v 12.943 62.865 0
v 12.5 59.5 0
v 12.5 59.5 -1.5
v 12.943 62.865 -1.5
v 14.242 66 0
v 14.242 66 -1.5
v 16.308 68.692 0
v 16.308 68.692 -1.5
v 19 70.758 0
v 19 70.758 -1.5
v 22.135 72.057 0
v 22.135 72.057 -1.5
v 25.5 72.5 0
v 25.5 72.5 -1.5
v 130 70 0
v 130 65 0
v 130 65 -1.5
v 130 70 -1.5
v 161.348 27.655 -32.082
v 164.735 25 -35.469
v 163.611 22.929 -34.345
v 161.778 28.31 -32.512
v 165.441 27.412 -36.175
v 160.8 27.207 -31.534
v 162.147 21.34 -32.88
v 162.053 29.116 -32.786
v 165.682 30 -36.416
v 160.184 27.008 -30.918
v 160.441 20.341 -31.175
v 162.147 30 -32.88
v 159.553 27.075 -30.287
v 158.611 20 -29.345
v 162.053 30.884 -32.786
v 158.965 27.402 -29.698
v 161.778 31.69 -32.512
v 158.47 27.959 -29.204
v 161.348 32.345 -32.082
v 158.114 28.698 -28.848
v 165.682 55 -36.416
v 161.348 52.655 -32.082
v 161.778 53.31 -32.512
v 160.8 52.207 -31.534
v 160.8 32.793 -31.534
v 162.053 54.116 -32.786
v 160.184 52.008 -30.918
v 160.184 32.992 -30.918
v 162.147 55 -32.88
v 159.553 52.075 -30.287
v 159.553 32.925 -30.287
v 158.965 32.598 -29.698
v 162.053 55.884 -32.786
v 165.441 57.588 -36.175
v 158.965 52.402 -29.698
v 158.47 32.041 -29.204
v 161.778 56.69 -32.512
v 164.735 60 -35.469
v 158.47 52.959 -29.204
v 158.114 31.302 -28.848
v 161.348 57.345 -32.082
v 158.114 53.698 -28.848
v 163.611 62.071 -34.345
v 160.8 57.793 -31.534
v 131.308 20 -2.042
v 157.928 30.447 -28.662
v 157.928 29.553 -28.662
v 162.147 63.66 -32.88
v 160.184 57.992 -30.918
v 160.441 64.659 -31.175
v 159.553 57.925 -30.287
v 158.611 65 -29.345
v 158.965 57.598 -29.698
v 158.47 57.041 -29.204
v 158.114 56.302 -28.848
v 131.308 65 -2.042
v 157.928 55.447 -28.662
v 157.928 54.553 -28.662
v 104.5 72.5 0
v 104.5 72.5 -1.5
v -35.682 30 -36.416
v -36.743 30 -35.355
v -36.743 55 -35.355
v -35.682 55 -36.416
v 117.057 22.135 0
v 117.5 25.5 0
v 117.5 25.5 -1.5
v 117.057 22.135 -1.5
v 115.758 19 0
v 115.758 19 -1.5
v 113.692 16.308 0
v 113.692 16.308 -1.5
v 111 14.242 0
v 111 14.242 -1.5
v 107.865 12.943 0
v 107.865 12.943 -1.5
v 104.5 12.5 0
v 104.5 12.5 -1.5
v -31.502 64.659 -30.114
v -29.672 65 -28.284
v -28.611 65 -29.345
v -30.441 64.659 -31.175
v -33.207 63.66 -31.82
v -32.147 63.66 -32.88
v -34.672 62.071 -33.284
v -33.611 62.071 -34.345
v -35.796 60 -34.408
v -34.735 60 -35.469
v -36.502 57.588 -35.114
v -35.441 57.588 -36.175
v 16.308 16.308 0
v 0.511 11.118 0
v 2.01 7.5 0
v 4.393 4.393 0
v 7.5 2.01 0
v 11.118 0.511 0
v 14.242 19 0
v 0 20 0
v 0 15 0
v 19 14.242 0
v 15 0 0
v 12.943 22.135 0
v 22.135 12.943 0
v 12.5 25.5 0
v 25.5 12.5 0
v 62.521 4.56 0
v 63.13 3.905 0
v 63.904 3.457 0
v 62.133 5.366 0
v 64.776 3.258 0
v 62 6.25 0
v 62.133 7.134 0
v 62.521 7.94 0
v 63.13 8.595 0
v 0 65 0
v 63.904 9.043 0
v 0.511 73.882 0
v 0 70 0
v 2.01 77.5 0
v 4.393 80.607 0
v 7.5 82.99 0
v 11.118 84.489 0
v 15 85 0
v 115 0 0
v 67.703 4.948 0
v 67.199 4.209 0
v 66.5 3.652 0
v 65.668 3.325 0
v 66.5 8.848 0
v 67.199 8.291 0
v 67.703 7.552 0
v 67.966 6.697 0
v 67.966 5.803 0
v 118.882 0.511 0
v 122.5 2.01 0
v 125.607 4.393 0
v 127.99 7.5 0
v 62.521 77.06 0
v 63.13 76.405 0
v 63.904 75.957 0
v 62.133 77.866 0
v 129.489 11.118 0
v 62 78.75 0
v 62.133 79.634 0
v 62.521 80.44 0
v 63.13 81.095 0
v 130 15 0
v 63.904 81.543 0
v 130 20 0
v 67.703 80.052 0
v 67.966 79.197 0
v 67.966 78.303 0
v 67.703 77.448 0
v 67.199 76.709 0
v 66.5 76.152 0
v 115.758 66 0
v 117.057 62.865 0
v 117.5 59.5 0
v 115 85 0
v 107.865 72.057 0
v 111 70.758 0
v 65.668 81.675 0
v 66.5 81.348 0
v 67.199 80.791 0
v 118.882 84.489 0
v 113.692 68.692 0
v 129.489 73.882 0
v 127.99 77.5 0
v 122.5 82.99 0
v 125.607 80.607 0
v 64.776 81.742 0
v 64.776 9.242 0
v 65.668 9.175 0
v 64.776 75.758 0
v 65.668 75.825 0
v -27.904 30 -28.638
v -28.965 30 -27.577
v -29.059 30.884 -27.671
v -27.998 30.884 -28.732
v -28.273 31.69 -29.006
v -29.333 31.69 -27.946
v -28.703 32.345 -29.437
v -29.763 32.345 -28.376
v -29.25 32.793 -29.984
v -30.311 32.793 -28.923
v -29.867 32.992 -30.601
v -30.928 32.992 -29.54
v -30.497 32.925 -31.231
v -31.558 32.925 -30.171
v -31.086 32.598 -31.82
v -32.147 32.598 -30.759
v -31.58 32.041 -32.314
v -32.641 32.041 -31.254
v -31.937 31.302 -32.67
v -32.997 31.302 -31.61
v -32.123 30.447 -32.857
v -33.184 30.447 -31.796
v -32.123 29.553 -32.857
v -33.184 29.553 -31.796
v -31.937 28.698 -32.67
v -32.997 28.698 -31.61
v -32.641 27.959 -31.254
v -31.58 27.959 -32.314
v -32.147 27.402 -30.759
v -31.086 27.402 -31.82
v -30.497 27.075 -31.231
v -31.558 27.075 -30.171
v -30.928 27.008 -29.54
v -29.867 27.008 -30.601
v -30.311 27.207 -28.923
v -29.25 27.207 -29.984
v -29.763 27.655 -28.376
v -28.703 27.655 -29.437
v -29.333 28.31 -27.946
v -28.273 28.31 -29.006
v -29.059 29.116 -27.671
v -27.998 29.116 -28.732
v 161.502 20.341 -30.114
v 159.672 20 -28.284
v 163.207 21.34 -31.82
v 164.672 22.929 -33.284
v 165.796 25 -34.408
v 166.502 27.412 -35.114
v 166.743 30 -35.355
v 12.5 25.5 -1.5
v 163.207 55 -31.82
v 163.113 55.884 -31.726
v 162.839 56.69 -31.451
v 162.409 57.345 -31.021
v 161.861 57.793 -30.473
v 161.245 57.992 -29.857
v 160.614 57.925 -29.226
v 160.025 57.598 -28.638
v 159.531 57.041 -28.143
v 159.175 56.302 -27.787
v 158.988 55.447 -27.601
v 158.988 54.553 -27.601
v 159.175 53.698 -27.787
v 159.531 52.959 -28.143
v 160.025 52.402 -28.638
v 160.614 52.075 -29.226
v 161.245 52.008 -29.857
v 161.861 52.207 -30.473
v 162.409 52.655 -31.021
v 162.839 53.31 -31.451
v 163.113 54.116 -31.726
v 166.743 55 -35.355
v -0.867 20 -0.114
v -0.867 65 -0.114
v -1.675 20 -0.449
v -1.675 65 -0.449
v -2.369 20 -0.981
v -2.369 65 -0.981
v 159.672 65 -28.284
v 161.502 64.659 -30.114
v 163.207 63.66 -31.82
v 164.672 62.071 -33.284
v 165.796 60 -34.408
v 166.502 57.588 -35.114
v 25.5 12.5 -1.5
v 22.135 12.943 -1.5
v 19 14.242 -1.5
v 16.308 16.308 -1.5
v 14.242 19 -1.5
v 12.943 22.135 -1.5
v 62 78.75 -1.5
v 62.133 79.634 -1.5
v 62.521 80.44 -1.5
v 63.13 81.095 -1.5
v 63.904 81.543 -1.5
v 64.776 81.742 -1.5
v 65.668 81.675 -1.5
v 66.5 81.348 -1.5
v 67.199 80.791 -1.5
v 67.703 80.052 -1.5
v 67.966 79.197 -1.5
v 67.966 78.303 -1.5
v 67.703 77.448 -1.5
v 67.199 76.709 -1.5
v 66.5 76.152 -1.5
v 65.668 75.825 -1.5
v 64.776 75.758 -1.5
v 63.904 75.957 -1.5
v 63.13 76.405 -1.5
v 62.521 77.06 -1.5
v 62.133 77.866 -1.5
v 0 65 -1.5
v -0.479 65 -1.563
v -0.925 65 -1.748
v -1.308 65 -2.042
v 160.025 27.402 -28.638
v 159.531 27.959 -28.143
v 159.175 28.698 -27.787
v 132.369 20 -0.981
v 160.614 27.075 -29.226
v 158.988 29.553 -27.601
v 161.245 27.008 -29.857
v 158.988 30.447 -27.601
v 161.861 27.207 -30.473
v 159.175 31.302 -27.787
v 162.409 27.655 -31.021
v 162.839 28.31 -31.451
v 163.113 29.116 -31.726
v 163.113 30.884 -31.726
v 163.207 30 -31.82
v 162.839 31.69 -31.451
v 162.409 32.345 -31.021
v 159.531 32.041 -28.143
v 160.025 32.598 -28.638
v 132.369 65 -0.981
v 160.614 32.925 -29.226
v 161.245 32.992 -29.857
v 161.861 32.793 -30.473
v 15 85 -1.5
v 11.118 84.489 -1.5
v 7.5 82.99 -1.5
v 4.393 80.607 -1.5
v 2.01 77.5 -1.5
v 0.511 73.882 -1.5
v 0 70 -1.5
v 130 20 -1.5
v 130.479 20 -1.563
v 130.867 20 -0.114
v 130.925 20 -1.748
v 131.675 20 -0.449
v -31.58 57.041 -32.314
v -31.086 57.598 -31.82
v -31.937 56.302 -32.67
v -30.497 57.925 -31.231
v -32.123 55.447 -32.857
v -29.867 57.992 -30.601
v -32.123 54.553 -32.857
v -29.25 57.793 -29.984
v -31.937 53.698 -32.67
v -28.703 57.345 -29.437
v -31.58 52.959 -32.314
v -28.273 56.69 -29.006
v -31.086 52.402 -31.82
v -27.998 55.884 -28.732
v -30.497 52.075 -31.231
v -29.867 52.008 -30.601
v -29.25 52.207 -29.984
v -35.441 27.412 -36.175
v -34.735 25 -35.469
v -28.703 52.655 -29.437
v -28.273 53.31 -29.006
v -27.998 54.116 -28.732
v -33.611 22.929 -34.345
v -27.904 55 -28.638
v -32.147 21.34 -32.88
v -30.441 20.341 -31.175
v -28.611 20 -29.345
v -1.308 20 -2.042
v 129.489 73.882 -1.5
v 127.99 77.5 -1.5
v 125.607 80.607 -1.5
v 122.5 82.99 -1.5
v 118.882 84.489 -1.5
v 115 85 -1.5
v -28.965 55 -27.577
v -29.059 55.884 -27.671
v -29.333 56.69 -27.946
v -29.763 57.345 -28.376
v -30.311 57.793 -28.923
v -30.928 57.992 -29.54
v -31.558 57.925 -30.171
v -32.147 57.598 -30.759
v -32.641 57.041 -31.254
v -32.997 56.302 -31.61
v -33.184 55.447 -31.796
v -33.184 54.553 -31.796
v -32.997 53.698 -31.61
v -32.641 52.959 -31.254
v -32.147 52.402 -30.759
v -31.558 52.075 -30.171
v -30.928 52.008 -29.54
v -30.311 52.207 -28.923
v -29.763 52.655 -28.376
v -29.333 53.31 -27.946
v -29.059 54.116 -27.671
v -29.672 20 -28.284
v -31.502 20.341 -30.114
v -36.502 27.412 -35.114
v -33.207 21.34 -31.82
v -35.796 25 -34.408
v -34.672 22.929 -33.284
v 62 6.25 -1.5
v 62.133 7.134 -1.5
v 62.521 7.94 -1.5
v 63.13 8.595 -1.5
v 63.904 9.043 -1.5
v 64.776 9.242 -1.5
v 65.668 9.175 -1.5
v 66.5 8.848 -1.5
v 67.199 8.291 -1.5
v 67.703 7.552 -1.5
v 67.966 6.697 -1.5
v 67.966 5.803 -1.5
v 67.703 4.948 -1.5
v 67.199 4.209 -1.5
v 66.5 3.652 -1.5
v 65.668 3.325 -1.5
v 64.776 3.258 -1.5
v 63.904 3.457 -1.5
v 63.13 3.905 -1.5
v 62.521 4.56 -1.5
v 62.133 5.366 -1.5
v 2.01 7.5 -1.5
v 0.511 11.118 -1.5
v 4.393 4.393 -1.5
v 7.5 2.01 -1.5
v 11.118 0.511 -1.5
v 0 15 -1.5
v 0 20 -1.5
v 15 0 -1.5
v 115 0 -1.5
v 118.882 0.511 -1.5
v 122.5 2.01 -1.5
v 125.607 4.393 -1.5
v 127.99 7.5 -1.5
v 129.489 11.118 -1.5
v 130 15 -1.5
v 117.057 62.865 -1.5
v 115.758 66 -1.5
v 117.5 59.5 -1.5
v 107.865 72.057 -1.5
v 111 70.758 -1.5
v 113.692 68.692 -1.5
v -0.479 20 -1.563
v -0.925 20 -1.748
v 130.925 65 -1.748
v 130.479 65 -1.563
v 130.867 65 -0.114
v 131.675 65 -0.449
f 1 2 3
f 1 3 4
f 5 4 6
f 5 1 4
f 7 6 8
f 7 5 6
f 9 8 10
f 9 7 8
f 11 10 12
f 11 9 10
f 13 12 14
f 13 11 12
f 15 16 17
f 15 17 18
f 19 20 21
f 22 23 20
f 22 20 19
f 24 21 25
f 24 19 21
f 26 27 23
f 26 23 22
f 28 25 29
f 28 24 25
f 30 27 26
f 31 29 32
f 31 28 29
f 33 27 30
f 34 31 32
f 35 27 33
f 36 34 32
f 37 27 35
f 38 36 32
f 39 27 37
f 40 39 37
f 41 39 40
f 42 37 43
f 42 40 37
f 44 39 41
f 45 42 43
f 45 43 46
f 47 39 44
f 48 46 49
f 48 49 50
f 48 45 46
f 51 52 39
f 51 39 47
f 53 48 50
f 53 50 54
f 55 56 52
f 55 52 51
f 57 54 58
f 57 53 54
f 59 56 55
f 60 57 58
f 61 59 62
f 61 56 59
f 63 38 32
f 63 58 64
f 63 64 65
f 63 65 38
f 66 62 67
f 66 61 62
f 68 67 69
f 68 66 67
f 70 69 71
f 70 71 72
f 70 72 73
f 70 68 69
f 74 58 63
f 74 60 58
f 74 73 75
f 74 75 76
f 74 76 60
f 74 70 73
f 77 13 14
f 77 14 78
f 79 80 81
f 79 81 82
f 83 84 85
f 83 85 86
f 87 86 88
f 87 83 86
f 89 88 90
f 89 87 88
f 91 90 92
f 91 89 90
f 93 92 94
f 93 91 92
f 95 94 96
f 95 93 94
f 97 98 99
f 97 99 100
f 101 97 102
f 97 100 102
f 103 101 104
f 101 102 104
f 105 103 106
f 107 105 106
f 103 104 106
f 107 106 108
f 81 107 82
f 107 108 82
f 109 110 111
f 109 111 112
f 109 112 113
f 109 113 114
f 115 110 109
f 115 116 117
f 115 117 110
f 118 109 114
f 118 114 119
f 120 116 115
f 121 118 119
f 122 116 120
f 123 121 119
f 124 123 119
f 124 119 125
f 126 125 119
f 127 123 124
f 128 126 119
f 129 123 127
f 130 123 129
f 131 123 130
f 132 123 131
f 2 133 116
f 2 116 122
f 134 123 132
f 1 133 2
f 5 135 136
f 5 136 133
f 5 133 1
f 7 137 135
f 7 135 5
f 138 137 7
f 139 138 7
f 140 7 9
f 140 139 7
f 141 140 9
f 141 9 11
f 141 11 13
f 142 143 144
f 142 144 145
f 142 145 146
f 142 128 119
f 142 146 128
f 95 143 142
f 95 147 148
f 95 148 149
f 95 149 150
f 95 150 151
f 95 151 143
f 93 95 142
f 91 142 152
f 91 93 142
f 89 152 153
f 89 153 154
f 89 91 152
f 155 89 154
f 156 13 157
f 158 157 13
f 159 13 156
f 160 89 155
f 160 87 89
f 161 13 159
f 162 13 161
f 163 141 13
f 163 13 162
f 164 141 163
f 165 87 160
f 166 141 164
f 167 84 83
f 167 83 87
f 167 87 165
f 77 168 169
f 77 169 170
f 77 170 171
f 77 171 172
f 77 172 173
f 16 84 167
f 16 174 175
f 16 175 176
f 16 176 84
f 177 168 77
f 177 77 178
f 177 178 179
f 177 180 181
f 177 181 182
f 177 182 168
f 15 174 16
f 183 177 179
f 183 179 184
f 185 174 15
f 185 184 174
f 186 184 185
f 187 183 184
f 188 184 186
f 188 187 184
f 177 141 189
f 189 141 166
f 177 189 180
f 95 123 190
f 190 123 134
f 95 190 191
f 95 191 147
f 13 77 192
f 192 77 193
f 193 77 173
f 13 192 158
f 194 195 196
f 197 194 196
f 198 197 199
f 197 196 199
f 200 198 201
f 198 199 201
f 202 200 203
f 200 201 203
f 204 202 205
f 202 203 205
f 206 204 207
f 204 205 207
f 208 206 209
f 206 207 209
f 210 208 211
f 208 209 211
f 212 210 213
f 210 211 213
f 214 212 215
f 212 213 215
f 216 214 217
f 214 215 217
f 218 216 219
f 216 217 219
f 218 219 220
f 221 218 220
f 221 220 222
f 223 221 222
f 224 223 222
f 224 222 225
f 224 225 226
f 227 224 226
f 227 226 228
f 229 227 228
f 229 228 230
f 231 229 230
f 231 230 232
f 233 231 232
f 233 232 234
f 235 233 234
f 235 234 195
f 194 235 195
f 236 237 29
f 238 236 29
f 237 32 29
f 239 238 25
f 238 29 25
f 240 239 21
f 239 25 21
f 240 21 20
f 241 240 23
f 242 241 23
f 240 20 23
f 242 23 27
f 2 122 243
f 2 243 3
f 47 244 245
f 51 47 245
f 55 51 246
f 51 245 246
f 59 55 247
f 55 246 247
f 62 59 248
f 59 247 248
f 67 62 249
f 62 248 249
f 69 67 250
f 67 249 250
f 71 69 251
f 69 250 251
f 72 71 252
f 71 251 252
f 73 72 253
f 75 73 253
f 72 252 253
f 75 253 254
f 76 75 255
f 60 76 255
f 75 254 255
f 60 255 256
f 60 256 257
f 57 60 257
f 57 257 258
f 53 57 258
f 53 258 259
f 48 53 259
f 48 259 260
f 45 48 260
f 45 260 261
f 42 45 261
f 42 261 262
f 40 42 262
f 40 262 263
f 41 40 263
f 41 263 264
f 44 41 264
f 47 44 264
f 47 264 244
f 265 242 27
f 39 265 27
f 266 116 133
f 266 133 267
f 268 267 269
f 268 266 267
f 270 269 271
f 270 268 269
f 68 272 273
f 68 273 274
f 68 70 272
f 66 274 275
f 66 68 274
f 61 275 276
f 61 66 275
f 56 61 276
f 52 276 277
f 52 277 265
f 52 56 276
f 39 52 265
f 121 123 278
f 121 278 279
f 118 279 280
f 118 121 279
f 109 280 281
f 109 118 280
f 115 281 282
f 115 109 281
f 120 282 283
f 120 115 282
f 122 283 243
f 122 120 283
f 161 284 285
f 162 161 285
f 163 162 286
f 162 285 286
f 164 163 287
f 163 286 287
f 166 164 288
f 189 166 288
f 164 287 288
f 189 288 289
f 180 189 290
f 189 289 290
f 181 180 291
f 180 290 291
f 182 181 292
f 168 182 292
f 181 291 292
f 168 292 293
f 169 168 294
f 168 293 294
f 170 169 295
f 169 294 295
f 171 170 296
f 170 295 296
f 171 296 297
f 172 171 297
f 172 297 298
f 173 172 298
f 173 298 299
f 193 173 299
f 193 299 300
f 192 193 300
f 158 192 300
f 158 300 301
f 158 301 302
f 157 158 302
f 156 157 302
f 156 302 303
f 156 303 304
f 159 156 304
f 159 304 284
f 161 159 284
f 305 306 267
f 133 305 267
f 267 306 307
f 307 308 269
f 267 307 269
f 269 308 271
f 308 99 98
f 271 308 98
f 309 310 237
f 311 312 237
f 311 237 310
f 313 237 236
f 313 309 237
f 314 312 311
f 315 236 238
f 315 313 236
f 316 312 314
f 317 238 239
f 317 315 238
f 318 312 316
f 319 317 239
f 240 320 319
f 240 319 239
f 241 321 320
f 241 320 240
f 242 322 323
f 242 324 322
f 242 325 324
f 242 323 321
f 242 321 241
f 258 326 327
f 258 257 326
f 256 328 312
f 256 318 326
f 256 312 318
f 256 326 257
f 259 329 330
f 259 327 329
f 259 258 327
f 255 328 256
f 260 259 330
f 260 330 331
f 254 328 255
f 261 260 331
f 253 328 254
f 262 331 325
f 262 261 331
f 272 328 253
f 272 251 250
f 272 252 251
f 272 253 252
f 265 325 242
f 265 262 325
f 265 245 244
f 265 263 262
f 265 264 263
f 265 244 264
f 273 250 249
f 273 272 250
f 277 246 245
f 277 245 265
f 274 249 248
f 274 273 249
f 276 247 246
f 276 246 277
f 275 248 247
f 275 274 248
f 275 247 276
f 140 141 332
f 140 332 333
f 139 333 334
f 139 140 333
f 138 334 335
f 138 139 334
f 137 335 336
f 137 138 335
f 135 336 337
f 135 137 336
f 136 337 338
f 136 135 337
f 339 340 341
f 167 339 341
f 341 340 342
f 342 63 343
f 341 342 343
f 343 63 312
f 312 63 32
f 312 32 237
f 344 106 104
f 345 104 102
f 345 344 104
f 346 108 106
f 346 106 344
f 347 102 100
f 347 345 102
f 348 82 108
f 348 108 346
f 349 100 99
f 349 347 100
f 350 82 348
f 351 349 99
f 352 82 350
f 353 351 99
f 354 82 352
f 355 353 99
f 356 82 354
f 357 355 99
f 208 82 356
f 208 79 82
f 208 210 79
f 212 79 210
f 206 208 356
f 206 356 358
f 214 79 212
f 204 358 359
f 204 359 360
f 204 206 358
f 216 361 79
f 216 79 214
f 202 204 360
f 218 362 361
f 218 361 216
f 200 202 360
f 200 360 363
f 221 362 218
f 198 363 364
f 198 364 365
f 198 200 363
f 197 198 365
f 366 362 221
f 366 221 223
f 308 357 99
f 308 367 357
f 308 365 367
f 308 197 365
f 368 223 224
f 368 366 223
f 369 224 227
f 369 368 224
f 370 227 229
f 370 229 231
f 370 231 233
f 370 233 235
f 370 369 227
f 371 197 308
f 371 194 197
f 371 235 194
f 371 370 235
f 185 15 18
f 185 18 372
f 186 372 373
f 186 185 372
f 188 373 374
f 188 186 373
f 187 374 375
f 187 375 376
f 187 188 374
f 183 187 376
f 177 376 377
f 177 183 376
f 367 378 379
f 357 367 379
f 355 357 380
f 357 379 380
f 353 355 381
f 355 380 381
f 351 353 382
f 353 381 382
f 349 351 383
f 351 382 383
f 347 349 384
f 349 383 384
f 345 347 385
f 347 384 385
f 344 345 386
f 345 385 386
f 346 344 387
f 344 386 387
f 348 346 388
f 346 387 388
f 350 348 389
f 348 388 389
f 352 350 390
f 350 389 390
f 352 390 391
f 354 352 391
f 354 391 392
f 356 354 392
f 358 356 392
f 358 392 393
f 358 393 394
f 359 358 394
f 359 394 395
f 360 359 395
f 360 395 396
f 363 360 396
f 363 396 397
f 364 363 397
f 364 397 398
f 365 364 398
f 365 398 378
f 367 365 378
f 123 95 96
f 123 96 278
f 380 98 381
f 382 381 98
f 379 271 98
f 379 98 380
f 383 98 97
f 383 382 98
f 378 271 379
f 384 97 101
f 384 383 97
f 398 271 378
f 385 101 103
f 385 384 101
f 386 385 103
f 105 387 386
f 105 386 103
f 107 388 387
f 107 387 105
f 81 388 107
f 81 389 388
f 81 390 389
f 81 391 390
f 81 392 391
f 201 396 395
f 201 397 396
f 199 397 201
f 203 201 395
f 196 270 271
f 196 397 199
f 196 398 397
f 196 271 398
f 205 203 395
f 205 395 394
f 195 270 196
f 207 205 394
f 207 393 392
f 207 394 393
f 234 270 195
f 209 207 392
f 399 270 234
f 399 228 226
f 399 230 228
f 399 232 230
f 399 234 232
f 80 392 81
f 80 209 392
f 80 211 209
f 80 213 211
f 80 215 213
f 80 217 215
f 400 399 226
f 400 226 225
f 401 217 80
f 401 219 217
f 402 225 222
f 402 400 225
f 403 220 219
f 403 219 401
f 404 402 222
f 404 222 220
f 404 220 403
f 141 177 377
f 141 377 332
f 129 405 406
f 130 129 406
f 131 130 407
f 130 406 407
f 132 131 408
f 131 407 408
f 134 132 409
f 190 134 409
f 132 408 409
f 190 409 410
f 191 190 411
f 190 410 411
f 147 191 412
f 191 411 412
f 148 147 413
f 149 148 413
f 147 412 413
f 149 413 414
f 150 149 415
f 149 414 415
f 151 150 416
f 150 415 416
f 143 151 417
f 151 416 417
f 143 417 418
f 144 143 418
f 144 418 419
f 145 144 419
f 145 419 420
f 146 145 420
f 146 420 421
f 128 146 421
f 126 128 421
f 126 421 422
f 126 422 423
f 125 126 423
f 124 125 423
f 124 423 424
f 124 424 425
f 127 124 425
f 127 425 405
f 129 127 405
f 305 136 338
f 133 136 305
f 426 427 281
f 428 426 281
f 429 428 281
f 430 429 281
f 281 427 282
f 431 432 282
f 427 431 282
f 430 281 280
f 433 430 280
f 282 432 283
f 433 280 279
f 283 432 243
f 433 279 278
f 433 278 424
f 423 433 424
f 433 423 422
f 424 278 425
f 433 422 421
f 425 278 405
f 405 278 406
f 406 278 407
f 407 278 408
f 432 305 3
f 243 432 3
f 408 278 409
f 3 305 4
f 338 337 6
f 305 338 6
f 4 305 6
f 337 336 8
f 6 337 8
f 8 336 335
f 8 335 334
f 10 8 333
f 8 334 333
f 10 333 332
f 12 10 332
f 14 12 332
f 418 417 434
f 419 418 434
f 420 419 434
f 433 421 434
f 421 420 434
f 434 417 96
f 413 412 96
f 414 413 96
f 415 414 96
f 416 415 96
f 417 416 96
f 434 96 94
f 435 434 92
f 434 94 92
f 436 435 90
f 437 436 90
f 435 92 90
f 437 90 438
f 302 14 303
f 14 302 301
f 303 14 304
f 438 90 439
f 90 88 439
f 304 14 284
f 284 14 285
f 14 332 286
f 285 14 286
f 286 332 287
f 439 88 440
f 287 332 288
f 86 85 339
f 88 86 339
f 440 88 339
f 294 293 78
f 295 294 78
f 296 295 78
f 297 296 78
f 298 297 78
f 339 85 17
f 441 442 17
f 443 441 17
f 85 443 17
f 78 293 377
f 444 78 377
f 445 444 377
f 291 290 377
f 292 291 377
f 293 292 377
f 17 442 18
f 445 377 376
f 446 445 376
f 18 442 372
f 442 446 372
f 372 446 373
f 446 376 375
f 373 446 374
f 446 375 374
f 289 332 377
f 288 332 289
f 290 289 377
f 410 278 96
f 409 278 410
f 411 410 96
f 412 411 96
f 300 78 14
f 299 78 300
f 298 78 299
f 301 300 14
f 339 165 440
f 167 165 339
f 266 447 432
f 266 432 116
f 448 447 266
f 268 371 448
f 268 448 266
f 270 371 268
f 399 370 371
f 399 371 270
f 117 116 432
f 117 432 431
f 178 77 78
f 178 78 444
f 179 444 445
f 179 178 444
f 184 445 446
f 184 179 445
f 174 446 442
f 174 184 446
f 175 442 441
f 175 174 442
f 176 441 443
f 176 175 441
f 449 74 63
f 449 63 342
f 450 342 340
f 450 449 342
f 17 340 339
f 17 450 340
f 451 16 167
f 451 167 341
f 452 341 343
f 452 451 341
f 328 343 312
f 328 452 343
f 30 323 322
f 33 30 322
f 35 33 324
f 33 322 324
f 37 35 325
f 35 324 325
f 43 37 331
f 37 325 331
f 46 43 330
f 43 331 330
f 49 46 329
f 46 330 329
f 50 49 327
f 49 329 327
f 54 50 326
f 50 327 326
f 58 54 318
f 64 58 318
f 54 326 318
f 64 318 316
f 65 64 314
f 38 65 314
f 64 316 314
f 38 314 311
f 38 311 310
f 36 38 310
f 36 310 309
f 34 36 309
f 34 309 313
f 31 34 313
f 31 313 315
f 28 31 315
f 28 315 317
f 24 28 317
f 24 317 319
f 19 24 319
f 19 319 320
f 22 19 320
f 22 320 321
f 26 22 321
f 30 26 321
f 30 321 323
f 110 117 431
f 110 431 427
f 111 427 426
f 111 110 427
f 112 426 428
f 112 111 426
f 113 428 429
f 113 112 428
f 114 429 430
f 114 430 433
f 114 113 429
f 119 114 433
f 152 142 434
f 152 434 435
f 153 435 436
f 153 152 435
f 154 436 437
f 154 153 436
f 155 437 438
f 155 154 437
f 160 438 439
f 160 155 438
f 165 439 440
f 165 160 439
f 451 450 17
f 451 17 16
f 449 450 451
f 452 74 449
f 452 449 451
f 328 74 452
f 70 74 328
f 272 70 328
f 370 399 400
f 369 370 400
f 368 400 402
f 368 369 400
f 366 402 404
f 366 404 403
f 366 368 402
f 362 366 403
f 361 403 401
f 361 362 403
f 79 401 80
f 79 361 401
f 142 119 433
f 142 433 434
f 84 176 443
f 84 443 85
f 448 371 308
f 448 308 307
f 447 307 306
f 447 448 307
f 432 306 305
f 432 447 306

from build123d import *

# Parameters (mm, degrees)
BASE_FLANGE1_DEPTH          = 1.5
SM_EDGE_FLANGE_1_DEPTH      = 45
SM_EDGE_FLANGE_1_BEND_DEPTH = 45
SKETCH12_R                  = 3
CUT_EXTRUDE1_DEPTH          = 10
FILLET1_R                   = 10
SKETCH13_R                  = 3
CUT_EXTRUDE2_DEPTH          = 10
SKETCH14_R                  = 3
CUT_EXTRUDE3_DEPTH          = 10


# Sheet-metal steps are written as plain solids
with BuildPart() as part:
    # Sketch1 → Base-Flange1 (new body)
    with BuildSketch(Plane.XY):
        with BuildLine():
            Line((15, 0), (115, 0))
            ThreePointArc((115, 0), (125.606601718, 4.393398282), (130, 15))
            Line((130, 15), (130, 70))
            ThreePointArc((130, 70), (125.606601718, 80.606601718), (115, 85))
            Line((115, 85), (15, 85))
            ThreePointArc((15, 85), (4.393398282, 80.606601718), (0, 70))
            Line((0, 70), (0, 15))
            ThreePointArc((0, 15), (4.393398282, 4.393398282), (15, 0))
        make_face()
        with BuildLine():
            Line((104.5, 12.5), (25.5, 12.5))
            ThreePointArc((25.5, 12.5), (16.307611845, 16.307611845), (12.5, 25.5))
            Line((12.5, 25.5), (12.5, 59.5))
            ThreePointArc((12.5, 59.5), (16.307611845, 68.692388155), (25.5, 72.5))
            Line((25.5, 72.5), (104.5, 72.5))
            ThreePointArc((104.5, 72.5), (113.692388155, 68.692388155), (117.5, 59.5))
            Line((117.5, 59.5), (117.5, 25.5))
            ThreePointArc((117.5, 25.5), (113.692388155, 16.307611845), (104.5, 12.5))
        make_face(mode=Mode.SUBTRACT)
    extrude(amount=-BASE_FLANGE1_DEPTH)

    # Ребро-кромка1 section (across the edge) → Ребро-кромка1 (add)
    with BuildSketch(Plane(origin=(-0.76629509, 20, -1.5), x_dir=(0.7071067811865438, 0, -0.7071067811865512), z_dir=(0, 1, 0))):
        with BuildLine():
            Line((-1.5, 0.76629509), (-1.5, 49.378679656))
            Line((-1.5, 49.378679656), (0, 49.378679656))
            Line((0, 49.378679656), (0, 0.76629509))
            ThreePointArc((0, 0.76629509), (0.140822865, 0.058330741), (0.541852455, -0.541852455))
            Line((0.541852455, -0.541852455), (-0.518807717, -1.602512627))
            ThreePointArc((-0.518807717, -1.602512627), (-1.244996434, -0.515694408), (-1.5, 0.76629509))
        make_face()
    extrude(amount=SM_EDGE_FLANGE_1_DEPTH)

    # Ребро-кромка1 section 2 (across the edge) → Ребро-кромка1 bend (add)
    with BuildSketch(Plane(origin=(130.76629509, 65, -1.5), x_dir=(-0.7071067811865438, 0, -0.7071067811865512), z_dir=(0, -1, 0))):
        with BuildLine():
            Line((-1.5, 0.76629509), (-1.5, 49.378679656))
            Line((-1.5, 49.378679656), (0, 49.378679656))
            Line((0, 49.378679656), (0, 0.76629509))
            ThreePointArc((0, 0.76629509), (0.140822865, 0.058330741), (0.541852455, -0.541852455))
            Line((0.541852455, -0.541852455), (-0.518807717, -1.602512627))
            ThreePointArc((-0.518807717, -1.602512627), (-1.244996434, -0.515694408), (-1.5, 0.76629509))
        make_face()
    extrude(amount=SM_EDGE_FLANGE_1_BEND_DEPTH)

    # Sketch12 → Cut-Extrude1 (cut)
    with BuildSketch(Plane(origin=(65.693807717, 0, 65.693807717), x_dir=(0.7071067811865511, 0, -0.707106781186544), z_dir=(0.707106781186544, 0, 0.7071067811865511))):
        with Locations((134.905073837, 30)):
            Circle(SKETCH12_R)
        with Locations((134.905073837, 55)):
            Circle(SKETCH12_R)
    extrude(amount=-CUT_EXTRUDE1_DEPTH, mode=Mode.SUBTRACT)

    # Fillet1
    fillet1_edges = [part.edges().sort_by_distance(p)[0] for p in [
        (-36.212624407, 20, -35.885669145),
        (-36.212624407, 65, -35.885669145),
        (166.212624407, 65, -35.885669145),
        (166.212624407, 20, -35.885669145),
    ]]
    fillet(fillet1_edges, radius=FILLET1_R)

    # Sketch13 → Cut-Extrude2 (cut)
    with BuildSketch(Plane(origin=(-0.693807717, 0, 0.693807717), x_dir=(0.7071067811865511, 0, 0.707106781186544), z_dir=(-0.707106781186544, 0, 0.7071067811865511))):
        with Locations((-42.981192283, 30)):
            Circle(SKETCH13_R)
        with Locations((-42.981192283, 55)):
            Circle(SKETCH13_R)
    extrude(amount=-CUT_EXTRUDE2_DEPTH, mode=Mode.SUBTRACT)

    # Sketch14 → Cut-Extrude3 (cut)
    with BuildSketch(Plane(origin=(0, 0, -1.5), x_dir=(-1, 0, 0), z_dir=(0, 0, -1))):
        with Locations((-65, 6.25)):
            Circle(SKETCH14_R)
        with Locations((-65, 78.75)):
            Circle(SKETCH14_R)
    extrude(amount=-CUT_EXTRUDE3_DEPTH, mode=Mode.SUBTRACT)


solid = part.part
